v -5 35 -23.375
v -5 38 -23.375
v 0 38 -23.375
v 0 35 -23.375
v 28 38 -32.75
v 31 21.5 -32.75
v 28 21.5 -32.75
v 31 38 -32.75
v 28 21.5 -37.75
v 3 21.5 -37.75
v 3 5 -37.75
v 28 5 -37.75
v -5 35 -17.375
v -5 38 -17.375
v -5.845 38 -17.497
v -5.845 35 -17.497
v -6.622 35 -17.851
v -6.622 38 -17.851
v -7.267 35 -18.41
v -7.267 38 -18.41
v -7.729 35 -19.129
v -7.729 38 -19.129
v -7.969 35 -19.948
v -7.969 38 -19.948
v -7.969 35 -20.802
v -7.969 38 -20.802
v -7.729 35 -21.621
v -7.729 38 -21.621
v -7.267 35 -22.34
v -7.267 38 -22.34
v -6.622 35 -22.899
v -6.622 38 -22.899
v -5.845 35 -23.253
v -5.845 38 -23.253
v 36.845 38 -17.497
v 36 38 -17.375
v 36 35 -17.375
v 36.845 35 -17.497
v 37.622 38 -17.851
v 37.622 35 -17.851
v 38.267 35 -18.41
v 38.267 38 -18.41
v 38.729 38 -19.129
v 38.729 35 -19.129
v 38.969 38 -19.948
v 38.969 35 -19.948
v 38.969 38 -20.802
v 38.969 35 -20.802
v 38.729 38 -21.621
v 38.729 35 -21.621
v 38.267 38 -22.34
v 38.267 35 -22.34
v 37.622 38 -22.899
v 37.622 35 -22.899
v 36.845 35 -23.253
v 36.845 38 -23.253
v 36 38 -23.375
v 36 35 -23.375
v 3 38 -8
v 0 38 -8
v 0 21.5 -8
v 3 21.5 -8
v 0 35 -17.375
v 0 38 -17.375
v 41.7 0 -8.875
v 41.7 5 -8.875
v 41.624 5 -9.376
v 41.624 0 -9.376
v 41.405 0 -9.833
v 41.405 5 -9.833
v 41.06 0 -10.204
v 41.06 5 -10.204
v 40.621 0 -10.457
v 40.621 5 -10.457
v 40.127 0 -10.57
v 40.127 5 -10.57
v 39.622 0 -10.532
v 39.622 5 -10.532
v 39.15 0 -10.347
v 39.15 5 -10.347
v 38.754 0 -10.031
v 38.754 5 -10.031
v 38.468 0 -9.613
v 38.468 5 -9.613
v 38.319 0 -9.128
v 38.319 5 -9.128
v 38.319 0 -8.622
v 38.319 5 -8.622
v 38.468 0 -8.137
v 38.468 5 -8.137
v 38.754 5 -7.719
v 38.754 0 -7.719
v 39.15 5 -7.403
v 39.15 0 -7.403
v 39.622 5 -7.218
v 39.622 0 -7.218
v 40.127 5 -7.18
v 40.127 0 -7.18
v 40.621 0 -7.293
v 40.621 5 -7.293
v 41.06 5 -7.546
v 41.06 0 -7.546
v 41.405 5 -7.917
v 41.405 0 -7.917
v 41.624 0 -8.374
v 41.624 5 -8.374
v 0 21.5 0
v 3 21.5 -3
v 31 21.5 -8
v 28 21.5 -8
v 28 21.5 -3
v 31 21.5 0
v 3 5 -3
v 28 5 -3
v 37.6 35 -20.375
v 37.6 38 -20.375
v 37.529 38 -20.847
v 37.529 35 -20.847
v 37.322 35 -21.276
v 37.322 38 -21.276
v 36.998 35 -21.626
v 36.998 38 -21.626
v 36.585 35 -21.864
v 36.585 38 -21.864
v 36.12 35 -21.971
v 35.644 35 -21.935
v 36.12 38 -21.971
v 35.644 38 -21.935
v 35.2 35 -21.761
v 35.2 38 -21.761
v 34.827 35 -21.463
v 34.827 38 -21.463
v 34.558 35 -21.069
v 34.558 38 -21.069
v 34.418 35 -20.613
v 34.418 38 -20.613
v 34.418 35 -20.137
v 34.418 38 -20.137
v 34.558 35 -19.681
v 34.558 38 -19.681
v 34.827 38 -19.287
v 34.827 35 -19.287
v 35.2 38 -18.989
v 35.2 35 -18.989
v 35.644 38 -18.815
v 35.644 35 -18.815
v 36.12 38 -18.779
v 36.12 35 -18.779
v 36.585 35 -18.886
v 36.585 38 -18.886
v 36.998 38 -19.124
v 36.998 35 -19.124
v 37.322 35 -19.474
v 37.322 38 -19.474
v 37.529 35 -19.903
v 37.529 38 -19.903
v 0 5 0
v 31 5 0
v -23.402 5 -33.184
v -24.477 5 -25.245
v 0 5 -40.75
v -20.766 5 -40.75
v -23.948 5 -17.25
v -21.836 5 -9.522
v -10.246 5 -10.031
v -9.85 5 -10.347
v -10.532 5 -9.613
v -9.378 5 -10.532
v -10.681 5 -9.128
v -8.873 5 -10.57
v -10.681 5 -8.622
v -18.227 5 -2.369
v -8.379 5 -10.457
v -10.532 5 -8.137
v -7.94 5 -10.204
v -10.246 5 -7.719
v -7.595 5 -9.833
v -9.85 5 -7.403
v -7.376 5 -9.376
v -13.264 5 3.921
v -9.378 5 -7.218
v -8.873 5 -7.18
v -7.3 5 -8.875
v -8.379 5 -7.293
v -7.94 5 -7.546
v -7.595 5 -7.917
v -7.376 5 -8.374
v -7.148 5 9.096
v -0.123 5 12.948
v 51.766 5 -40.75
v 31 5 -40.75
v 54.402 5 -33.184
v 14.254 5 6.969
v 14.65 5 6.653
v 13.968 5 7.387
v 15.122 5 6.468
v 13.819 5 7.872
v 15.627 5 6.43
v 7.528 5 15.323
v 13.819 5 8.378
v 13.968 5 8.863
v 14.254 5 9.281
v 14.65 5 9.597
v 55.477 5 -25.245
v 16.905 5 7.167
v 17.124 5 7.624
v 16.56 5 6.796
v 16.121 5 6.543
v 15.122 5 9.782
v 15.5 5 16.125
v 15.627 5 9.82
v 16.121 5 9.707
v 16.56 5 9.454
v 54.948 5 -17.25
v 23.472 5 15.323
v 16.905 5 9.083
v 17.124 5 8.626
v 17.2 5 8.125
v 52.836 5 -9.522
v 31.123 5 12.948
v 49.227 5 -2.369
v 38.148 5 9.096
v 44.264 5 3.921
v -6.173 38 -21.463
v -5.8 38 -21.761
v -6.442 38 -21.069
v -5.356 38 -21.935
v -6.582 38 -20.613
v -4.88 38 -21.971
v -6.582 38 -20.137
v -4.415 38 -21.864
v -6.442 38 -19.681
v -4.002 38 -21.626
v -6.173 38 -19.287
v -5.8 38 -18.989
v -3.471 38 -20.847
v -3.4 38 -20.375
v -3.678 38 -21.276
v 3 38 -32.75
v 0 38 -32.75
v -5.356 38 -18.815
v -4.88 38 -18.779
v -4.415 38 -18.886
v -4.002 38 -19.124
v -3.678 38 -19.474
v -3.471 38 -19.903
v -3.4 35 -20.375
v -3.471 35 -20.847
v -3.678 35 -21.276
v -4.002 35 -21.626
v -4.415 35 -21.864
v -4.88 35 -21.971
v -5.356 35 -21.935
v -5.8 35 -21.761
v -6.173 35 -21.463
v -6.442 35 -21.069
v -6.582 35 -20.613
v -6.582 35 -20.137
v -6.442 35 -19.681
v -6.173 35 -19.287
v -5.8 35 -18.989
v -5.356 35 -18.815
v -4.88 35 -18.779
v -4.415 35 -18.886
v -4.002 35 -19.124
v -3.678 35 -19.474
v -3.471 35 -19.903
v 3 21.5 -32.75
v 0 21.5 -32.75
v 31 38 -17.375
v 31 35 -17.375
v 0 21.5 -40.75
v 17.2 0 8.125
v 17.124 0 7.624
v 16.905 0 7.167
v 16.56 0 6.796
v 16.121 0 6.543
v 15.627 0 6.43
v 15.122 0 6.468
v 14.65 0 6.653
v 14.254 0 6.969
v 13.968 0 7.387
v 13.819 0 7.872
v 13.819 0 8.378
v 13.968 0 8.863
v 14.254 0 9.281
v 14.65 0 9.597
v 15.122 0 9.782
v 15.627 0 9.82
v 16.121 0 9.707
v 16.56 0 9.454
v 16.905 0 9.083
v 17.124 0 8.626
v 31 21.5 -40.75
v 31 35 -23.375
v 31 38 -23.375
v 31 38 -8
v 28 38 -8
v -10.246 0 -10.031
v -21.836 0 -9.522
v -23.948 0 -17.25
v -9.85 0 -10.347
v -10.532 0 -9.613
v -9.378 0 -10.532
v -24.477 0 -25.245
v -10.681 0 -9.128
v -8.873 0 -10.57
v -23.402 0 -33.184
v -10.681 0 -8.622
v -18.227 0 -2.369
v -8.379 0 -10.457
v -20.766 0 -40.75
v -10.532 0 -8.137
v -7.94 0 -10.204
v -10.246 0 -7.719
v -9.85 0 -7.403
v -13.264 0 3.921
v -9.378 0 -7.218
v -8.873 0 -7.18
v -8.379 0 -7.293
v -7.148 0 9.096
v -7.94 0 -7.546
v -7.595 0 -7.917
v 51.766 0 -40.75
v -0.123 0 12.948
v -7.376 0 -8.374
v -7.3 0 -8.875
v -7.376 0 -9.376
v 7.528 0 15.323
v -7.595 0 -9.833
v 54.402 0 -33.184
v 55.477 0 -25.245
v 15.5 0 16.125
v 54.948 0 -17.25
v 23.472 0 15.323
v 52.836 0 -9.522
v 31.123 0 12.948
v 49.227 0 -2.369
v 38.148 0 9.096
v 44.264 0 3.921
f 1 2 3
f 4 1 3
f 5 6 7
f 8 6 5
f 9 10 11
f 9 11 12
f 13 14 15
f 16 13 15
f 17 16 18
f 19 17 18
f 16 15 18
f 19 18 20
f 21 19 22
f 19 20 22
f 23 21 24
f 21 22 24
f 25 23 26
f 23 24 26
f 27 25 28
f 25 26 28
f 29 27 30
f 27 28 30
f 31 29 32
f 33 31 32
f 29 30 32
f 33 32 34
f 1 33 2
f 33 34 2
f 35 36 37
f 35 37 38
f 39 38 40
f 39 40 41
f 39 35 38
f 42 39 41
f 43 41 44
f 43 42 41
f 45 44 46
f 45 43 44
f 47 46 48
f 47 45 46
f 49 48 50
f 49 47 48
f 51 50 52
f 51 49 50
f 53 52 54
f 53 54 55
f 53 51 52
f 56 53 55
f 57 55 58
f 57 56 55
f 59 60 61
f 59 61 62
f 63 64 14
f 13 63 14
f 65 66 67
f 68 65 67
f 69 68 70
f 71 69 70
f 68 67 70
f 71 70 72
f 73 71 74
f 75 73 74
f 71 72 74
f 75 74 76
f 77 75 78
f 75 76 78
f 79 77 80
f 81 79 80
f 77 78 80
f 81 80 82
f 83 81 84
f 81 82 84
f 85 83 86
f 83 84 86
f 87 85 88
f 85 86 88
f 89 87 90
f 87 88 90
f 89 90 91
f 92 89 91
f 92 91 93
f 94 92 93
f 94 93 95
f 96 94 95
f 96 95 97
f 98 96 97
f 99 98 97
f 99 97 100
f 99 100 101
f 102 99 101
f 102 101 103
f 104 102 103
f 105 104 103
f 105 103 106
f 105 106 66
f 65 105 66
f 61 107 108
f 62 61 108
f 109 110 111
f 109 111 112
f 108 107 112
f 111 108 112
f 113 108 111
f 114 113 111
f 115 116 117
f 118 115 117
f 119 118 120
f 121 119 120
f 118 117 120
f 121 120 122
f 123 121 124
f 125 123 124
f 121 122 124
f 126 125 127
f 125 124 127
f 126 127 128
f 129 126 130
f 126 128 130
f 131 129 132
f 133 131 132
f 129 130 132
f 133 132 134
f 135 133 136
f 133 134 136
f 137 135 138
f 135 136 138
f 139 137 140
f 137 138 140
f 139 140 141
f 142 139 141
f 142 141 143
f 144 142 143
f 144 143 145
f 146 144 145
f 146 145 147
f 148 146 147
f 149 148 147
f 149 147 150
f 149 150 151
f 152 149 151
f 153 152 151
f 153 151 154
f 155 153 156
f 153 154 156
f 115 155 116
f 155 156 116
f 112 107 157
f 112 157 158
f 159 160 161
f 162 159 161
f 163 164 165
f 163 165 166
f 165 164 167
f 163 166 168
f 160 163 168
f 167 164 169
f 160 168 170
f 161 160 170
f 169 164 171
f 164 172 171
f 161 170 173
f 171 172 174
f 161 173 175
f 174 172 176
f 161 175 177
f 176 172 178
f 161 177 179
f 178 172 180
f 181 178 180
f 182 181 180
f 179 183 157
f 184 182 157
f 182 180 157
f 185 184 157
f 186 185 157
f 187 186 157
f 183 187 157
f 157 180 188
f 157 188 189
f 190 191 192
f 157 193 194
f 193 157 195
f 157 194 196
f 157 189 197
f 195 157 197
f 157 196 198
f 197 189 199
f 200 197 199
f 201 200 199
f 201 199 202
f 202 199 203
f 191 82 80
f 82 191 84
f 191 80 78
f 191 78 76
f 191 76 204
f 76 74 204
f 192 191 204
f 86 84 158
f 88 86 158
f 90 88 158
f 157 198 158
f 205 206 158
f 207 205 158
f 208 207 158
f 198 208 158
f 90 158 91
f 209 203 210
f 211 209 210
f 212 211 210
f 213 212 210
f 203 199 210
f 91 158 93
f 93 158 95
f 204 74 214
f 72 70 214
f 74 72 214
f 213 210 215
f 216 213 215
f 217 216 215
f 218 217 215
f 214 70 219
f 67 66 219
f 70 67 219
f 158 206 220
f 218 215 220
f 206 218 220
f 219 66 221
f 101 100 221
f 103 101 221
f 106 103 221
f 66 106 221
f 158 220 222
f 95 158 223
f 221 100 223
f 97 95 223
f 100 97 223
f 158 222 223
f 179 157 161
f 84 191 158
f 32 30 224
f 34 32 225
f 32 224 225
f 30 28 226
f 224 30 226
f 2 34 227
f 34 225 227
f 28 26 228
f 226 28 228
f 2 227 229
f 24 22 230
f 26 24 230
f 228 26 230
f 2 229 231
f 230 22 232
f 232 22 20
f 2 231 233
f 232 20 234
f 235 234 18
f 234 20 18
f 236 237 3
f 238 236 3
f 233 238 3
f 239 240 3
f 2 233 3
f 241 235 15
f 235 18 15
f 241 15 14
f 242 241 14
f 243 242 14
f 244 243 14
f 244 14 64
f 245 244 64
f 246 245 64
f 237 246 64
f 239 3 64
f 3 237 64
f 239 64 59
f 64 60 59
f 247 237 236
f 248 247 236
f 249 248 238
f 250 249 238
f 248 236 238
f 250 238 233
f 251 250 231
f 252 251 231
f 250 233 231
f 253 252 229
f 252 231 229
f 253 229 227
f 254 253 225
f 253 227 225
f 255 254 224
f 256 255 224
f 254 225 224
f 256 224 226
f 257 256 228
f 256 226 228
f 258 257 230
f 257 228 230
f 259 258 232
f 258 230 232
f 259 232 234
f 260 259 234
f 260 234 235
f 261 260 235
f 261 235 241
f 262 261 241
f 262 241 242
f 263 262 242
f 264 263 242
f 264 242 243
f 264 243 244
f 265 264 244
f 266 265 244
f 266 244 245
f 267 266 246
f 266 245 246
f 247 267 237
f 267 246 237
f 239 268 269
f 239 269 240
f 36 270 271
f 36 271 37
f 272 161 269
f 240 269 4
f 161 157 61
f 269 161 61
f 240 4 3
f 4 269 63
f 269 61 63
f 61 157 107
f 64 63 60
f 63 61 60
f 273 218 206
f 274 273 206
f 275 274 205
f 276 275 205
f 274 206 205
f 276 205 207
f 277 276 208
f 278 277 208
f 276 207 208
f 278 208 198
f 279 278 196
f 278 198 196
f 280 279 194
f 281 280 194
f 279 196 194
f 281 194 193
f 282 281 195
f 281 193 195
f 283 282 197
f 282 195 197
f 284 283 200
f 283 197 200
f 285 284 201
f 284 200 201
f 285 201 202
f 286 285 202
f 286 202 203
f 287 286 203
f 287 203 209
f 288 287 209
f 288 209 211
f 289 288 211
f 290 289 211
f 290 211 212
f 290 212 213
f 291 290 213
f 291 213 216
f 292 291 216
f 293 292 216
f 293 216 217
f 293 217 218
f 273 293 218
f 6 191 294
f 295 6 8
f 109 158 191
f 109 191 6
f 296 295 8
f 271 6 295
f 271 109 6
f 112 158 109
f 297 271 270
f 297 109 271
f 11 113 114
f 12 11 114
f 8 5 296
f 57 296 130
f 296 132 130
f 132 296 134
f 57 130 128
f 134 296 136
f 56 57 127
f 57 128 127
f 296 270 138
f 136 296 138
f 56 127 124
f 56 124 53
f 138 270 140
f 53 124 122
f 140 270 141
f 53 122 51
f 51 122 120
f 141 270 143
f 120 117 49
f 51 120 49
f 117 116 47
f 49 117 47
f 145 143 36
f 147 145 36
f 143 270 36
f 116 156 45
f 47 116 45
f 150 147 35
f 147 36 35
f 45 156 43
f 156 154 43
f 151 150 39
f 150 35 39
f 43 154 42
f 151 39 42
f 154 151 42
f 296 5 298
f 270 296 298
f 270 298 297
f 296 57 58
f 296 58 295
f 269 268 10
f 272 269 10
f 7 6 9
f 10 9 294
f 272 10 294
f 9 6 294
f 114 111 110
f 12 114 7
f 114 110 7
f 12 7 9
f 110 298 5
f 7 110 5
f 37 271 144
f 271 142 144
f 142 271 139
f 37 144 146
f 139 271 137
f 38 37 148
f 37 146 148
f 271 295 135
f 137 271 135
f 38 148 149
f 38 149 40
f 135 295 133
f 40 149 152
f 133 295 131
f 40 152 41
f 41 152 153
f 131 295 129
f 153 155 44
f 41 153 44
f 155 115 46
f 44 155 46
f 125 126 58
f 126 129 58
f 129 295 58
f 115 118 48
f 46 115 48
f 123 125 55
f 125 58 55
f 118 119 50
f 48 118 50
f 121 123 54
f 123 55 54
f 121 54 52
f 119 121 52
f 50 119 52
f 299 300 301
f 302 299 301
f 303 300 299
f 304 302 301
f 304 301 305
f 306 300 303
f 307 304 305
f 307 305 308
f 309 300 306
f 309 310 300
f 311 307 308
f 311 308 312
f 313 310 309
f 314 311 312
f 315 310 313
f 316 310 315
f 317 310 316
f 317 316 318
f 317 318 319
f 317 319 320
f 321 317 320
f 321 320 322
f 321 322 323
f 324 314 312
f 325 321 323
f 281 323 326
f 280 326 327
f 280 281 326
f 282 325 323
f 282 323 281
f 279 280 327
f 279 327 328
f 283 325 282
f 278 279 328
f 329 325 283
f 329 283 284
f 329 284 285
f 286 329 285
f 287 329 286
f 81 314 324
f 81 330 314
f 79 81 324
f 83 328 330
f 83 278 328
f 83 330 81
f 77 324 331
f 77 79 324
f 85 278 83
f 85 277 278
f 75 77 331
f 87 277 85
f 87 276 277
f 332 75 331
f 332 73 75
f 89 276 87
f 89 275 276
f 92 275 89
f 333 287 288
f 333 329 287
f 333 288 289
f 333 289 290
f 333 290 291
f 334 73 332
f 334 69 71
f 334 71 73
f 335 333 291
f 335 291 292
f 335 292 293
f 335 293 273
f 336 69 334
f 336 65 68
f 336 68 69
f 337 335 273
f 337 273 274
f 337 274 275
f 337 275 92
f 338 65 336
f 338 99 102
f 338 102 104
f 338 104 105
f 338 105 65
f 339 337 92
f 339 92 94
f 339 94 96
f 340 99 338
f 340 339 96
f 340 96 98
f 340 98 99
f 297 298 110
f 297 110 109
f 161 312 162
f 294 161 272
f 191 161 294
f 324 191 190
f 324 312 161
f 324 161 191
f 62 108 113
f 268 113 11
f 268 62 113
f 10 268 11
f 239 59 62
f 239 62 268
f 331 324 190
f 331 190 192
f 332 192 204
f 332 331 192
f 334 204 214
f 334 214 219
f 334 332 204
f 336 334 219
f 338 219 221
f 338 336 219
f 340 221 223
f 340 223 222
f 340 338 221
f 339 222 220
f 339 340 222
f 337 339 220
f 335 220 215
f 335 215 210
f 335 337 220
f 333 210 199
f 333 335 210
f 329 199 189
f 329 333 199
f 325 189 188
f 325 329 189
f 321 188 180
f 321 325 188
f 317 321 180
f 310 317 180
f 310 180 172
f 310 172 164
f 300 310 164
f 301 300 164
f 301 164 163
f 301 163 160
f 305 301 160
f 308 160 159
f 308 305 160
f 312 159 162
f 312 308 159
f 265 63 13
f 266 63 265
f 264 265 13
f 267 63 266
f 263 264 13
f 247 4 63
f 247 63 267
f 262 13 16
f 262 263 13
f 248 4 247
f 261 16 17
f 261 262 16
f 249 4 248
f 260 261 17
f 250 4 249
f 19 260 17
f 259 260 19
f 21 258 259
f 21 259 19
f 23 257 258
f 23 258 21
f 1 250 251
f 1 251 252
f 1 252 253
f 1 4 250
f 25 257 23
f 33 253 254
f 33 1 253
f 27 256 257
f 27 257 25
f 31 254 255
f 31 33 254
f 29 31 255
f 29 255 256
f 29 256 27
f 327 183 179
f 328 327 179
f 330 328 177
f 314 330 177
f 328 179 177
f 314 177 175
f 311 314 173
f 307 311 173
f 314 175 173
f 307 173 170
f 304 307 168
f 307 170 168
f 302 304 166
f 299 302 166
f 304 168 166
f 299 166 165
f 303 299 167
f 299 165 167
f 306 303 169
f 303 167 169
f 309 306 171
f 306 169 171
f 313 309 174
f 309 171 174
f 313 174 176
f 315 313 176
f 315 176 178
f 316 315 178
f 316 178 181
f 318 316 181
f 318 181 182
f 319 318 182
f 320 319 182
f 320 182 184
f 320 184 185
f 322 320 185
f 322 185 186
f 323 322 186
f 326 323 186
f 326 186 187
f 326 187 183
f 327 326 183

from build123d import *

# Parameters (mm, degrees)
SKETCH_1_W          = 31
SKETCH_1_H          = 38
EXTRUDE_1_DEPTH     = 40.75
SKETCH_2_W          = 8
SKETCH_2_H          = 16.5
CUT_EXTRUDE_1_DEPTH = 40.75
SKETCH_3_W          = 25
SKETCH_3_H          = 34.75
CUT_EXTRUDE_2_DEPTH = 34.5
SKETCH_4_R          = 12.5
CUT_EXTRUDE_3_DEPTH = 34.5
SKETCH_5_R          = 1.6
EXTRUDE_2_DEPTH     = 3
EXTRUDE_5_DEPTH     = 5
SKETCH_9_R          = 1.7
CUT_EXTRUDE_4_DEPTH = 10
SKETCH_11_R         = 1.7
CUT_EXTRUDE_5_DEPTH = 10
SKETCH_12_W         = 31
SKETCH_12_H         = 16.5
CUT_EXTRUDE_6_DEPTH = 8


with BuildPart() as part:
    # 草图1 → 凸台-拉伸1 (new body)
    with BuildSketch(Plane.XY):
        with Locations((15.5, 19)):
            Rectangle(SKETCH_1_W, SKETCH_1_H)
    extrude(amount=-EXTRUDE_1_DEPTH)

    # 草图2 → 切除-拉伸1 (cut)
    with BuildSketch(Plane(origin=(31, 0, 0), x_dir=(0, 0, -1), z_dir=(1, 0, 0))):
        with Locations((36.75, 29.75)):
            Rectangle(SKETCH_2_W, SKETCH_2_H)
    extrude(amount=-CUT_EXTRUDE_1_DEPTH, mode=Mode.SUBTRACT)

    # 草图3 → 切除-拉伸2 (cut)
    with BuildSketch(Plane(origin=(0, 38, 0), x_dir=(1, 0, 0), z_dir=(0, 1, 0))):
        with Locations((15.5, 20.375)):
            Rectangle(SKETCH_3_W, SKETCH_3_H)
    extrude(amount=-CUT_EXTRUDE_2_DEPTH, mode=Mode.SUBTRACT)

    # 草图4 → 切除-拉伸3 (cut)
    with BuildSketch(Plane.XY):
        with Locations((15.5, 38)):
            Circle(SKETCH_4_R)
    extrude(amount=-CUT_EXTRUDE_3_DEPTH, mode=Mode.SUBTRACT)

    # 草图5 → 凸台-拉伸2 (add)
    with BuildSketch(Plane(origin=(0, 38, 0), x_dir=(1, 0, 0), z_dir=(0, 1, 0))):
        with BuildLine():
            Line((36, 23.375), (31, 23.375))
            Line((31, 23.375), (31, 17.375))
            Line((31, 17.375), (36, 17.375))
            ThreePointArc((36, 17.375), (39, 20.375), (36, 23.375))
        make_face()
        with Locations((36, 20.375)):
            Circle(SKETCH_5_R, mode=Mode.SUBTRACT)
        with BuildLine():
            Line((0, 23.375), (0, 17.375))
            Line((0, 17.375), (-5, 17.375))
            ThreePointArc((-5, 17.375), (-8, 20.375), (-5, 23.375))
            Line((-5, 23.375), (0, 23.375))
        make_face()
        with Locations((-5, 20.375)):
            Circle(SKETCH_5_R, mode=Mode.SUBTRACT)
    extrude(amount=-EXTRUDE_2_DEPTH)

    # 草图8 → 凸台-拉伸5 (add)
    with BuildSketch(Plane.XZ):
        with BuildLine():
            Line((-20.766160191, -40.75), (51.766160191, -40.75))
            ThreePointArc((51.766160191, -40.75), (15.5, 16.125), (-20.766160191, -40.75))
        make_face()
    extrude(amount=-EXTRUDE_5_DEPTH)

    # 草图9 → 切除-拉伸4 (cut)
    with BuildSketch(Plane(origin=(0, 5, 0), x_dir=(1, 0, 0), z_dir=(0, 1, 0))):
        with Locations((40, 8.875)):
            Circle(SKETCH_9_R)
        with Locations((-9, 8.875)):
            Circle(SKETCH_9_R)
    extrude(amount=-CUT_EXTRUDE_4_DEPTH, mode=Mode.SUBTRACT)

    # 草图11 → 切除-拉伸5 (cut)
    with BuildSketch(Plane(origin=(0, 5, 0), x_dir=(1, 0, 0), z_dir=(0, 1, 0))):
        with Locations((15.5, -8.125)):
            Circle(SKETCH_11_R)
    extrude(amount=-CUT_EXTRUDE_5_DEPTH, mode=Mode.SUBTRACT)

    # 草图12 → 切除-拉伸6 (cut)
    with BuildSketch(Plane.XY):
        with Locations((15.5, 29.75)):
            Rectangle(SKETCH_12_W, SKETCH_12_H)
    extrude(amount=-CUT_EXTRUDE_6_DEPTH, mode=Mode.SUBTRACT)


solid = part.part
